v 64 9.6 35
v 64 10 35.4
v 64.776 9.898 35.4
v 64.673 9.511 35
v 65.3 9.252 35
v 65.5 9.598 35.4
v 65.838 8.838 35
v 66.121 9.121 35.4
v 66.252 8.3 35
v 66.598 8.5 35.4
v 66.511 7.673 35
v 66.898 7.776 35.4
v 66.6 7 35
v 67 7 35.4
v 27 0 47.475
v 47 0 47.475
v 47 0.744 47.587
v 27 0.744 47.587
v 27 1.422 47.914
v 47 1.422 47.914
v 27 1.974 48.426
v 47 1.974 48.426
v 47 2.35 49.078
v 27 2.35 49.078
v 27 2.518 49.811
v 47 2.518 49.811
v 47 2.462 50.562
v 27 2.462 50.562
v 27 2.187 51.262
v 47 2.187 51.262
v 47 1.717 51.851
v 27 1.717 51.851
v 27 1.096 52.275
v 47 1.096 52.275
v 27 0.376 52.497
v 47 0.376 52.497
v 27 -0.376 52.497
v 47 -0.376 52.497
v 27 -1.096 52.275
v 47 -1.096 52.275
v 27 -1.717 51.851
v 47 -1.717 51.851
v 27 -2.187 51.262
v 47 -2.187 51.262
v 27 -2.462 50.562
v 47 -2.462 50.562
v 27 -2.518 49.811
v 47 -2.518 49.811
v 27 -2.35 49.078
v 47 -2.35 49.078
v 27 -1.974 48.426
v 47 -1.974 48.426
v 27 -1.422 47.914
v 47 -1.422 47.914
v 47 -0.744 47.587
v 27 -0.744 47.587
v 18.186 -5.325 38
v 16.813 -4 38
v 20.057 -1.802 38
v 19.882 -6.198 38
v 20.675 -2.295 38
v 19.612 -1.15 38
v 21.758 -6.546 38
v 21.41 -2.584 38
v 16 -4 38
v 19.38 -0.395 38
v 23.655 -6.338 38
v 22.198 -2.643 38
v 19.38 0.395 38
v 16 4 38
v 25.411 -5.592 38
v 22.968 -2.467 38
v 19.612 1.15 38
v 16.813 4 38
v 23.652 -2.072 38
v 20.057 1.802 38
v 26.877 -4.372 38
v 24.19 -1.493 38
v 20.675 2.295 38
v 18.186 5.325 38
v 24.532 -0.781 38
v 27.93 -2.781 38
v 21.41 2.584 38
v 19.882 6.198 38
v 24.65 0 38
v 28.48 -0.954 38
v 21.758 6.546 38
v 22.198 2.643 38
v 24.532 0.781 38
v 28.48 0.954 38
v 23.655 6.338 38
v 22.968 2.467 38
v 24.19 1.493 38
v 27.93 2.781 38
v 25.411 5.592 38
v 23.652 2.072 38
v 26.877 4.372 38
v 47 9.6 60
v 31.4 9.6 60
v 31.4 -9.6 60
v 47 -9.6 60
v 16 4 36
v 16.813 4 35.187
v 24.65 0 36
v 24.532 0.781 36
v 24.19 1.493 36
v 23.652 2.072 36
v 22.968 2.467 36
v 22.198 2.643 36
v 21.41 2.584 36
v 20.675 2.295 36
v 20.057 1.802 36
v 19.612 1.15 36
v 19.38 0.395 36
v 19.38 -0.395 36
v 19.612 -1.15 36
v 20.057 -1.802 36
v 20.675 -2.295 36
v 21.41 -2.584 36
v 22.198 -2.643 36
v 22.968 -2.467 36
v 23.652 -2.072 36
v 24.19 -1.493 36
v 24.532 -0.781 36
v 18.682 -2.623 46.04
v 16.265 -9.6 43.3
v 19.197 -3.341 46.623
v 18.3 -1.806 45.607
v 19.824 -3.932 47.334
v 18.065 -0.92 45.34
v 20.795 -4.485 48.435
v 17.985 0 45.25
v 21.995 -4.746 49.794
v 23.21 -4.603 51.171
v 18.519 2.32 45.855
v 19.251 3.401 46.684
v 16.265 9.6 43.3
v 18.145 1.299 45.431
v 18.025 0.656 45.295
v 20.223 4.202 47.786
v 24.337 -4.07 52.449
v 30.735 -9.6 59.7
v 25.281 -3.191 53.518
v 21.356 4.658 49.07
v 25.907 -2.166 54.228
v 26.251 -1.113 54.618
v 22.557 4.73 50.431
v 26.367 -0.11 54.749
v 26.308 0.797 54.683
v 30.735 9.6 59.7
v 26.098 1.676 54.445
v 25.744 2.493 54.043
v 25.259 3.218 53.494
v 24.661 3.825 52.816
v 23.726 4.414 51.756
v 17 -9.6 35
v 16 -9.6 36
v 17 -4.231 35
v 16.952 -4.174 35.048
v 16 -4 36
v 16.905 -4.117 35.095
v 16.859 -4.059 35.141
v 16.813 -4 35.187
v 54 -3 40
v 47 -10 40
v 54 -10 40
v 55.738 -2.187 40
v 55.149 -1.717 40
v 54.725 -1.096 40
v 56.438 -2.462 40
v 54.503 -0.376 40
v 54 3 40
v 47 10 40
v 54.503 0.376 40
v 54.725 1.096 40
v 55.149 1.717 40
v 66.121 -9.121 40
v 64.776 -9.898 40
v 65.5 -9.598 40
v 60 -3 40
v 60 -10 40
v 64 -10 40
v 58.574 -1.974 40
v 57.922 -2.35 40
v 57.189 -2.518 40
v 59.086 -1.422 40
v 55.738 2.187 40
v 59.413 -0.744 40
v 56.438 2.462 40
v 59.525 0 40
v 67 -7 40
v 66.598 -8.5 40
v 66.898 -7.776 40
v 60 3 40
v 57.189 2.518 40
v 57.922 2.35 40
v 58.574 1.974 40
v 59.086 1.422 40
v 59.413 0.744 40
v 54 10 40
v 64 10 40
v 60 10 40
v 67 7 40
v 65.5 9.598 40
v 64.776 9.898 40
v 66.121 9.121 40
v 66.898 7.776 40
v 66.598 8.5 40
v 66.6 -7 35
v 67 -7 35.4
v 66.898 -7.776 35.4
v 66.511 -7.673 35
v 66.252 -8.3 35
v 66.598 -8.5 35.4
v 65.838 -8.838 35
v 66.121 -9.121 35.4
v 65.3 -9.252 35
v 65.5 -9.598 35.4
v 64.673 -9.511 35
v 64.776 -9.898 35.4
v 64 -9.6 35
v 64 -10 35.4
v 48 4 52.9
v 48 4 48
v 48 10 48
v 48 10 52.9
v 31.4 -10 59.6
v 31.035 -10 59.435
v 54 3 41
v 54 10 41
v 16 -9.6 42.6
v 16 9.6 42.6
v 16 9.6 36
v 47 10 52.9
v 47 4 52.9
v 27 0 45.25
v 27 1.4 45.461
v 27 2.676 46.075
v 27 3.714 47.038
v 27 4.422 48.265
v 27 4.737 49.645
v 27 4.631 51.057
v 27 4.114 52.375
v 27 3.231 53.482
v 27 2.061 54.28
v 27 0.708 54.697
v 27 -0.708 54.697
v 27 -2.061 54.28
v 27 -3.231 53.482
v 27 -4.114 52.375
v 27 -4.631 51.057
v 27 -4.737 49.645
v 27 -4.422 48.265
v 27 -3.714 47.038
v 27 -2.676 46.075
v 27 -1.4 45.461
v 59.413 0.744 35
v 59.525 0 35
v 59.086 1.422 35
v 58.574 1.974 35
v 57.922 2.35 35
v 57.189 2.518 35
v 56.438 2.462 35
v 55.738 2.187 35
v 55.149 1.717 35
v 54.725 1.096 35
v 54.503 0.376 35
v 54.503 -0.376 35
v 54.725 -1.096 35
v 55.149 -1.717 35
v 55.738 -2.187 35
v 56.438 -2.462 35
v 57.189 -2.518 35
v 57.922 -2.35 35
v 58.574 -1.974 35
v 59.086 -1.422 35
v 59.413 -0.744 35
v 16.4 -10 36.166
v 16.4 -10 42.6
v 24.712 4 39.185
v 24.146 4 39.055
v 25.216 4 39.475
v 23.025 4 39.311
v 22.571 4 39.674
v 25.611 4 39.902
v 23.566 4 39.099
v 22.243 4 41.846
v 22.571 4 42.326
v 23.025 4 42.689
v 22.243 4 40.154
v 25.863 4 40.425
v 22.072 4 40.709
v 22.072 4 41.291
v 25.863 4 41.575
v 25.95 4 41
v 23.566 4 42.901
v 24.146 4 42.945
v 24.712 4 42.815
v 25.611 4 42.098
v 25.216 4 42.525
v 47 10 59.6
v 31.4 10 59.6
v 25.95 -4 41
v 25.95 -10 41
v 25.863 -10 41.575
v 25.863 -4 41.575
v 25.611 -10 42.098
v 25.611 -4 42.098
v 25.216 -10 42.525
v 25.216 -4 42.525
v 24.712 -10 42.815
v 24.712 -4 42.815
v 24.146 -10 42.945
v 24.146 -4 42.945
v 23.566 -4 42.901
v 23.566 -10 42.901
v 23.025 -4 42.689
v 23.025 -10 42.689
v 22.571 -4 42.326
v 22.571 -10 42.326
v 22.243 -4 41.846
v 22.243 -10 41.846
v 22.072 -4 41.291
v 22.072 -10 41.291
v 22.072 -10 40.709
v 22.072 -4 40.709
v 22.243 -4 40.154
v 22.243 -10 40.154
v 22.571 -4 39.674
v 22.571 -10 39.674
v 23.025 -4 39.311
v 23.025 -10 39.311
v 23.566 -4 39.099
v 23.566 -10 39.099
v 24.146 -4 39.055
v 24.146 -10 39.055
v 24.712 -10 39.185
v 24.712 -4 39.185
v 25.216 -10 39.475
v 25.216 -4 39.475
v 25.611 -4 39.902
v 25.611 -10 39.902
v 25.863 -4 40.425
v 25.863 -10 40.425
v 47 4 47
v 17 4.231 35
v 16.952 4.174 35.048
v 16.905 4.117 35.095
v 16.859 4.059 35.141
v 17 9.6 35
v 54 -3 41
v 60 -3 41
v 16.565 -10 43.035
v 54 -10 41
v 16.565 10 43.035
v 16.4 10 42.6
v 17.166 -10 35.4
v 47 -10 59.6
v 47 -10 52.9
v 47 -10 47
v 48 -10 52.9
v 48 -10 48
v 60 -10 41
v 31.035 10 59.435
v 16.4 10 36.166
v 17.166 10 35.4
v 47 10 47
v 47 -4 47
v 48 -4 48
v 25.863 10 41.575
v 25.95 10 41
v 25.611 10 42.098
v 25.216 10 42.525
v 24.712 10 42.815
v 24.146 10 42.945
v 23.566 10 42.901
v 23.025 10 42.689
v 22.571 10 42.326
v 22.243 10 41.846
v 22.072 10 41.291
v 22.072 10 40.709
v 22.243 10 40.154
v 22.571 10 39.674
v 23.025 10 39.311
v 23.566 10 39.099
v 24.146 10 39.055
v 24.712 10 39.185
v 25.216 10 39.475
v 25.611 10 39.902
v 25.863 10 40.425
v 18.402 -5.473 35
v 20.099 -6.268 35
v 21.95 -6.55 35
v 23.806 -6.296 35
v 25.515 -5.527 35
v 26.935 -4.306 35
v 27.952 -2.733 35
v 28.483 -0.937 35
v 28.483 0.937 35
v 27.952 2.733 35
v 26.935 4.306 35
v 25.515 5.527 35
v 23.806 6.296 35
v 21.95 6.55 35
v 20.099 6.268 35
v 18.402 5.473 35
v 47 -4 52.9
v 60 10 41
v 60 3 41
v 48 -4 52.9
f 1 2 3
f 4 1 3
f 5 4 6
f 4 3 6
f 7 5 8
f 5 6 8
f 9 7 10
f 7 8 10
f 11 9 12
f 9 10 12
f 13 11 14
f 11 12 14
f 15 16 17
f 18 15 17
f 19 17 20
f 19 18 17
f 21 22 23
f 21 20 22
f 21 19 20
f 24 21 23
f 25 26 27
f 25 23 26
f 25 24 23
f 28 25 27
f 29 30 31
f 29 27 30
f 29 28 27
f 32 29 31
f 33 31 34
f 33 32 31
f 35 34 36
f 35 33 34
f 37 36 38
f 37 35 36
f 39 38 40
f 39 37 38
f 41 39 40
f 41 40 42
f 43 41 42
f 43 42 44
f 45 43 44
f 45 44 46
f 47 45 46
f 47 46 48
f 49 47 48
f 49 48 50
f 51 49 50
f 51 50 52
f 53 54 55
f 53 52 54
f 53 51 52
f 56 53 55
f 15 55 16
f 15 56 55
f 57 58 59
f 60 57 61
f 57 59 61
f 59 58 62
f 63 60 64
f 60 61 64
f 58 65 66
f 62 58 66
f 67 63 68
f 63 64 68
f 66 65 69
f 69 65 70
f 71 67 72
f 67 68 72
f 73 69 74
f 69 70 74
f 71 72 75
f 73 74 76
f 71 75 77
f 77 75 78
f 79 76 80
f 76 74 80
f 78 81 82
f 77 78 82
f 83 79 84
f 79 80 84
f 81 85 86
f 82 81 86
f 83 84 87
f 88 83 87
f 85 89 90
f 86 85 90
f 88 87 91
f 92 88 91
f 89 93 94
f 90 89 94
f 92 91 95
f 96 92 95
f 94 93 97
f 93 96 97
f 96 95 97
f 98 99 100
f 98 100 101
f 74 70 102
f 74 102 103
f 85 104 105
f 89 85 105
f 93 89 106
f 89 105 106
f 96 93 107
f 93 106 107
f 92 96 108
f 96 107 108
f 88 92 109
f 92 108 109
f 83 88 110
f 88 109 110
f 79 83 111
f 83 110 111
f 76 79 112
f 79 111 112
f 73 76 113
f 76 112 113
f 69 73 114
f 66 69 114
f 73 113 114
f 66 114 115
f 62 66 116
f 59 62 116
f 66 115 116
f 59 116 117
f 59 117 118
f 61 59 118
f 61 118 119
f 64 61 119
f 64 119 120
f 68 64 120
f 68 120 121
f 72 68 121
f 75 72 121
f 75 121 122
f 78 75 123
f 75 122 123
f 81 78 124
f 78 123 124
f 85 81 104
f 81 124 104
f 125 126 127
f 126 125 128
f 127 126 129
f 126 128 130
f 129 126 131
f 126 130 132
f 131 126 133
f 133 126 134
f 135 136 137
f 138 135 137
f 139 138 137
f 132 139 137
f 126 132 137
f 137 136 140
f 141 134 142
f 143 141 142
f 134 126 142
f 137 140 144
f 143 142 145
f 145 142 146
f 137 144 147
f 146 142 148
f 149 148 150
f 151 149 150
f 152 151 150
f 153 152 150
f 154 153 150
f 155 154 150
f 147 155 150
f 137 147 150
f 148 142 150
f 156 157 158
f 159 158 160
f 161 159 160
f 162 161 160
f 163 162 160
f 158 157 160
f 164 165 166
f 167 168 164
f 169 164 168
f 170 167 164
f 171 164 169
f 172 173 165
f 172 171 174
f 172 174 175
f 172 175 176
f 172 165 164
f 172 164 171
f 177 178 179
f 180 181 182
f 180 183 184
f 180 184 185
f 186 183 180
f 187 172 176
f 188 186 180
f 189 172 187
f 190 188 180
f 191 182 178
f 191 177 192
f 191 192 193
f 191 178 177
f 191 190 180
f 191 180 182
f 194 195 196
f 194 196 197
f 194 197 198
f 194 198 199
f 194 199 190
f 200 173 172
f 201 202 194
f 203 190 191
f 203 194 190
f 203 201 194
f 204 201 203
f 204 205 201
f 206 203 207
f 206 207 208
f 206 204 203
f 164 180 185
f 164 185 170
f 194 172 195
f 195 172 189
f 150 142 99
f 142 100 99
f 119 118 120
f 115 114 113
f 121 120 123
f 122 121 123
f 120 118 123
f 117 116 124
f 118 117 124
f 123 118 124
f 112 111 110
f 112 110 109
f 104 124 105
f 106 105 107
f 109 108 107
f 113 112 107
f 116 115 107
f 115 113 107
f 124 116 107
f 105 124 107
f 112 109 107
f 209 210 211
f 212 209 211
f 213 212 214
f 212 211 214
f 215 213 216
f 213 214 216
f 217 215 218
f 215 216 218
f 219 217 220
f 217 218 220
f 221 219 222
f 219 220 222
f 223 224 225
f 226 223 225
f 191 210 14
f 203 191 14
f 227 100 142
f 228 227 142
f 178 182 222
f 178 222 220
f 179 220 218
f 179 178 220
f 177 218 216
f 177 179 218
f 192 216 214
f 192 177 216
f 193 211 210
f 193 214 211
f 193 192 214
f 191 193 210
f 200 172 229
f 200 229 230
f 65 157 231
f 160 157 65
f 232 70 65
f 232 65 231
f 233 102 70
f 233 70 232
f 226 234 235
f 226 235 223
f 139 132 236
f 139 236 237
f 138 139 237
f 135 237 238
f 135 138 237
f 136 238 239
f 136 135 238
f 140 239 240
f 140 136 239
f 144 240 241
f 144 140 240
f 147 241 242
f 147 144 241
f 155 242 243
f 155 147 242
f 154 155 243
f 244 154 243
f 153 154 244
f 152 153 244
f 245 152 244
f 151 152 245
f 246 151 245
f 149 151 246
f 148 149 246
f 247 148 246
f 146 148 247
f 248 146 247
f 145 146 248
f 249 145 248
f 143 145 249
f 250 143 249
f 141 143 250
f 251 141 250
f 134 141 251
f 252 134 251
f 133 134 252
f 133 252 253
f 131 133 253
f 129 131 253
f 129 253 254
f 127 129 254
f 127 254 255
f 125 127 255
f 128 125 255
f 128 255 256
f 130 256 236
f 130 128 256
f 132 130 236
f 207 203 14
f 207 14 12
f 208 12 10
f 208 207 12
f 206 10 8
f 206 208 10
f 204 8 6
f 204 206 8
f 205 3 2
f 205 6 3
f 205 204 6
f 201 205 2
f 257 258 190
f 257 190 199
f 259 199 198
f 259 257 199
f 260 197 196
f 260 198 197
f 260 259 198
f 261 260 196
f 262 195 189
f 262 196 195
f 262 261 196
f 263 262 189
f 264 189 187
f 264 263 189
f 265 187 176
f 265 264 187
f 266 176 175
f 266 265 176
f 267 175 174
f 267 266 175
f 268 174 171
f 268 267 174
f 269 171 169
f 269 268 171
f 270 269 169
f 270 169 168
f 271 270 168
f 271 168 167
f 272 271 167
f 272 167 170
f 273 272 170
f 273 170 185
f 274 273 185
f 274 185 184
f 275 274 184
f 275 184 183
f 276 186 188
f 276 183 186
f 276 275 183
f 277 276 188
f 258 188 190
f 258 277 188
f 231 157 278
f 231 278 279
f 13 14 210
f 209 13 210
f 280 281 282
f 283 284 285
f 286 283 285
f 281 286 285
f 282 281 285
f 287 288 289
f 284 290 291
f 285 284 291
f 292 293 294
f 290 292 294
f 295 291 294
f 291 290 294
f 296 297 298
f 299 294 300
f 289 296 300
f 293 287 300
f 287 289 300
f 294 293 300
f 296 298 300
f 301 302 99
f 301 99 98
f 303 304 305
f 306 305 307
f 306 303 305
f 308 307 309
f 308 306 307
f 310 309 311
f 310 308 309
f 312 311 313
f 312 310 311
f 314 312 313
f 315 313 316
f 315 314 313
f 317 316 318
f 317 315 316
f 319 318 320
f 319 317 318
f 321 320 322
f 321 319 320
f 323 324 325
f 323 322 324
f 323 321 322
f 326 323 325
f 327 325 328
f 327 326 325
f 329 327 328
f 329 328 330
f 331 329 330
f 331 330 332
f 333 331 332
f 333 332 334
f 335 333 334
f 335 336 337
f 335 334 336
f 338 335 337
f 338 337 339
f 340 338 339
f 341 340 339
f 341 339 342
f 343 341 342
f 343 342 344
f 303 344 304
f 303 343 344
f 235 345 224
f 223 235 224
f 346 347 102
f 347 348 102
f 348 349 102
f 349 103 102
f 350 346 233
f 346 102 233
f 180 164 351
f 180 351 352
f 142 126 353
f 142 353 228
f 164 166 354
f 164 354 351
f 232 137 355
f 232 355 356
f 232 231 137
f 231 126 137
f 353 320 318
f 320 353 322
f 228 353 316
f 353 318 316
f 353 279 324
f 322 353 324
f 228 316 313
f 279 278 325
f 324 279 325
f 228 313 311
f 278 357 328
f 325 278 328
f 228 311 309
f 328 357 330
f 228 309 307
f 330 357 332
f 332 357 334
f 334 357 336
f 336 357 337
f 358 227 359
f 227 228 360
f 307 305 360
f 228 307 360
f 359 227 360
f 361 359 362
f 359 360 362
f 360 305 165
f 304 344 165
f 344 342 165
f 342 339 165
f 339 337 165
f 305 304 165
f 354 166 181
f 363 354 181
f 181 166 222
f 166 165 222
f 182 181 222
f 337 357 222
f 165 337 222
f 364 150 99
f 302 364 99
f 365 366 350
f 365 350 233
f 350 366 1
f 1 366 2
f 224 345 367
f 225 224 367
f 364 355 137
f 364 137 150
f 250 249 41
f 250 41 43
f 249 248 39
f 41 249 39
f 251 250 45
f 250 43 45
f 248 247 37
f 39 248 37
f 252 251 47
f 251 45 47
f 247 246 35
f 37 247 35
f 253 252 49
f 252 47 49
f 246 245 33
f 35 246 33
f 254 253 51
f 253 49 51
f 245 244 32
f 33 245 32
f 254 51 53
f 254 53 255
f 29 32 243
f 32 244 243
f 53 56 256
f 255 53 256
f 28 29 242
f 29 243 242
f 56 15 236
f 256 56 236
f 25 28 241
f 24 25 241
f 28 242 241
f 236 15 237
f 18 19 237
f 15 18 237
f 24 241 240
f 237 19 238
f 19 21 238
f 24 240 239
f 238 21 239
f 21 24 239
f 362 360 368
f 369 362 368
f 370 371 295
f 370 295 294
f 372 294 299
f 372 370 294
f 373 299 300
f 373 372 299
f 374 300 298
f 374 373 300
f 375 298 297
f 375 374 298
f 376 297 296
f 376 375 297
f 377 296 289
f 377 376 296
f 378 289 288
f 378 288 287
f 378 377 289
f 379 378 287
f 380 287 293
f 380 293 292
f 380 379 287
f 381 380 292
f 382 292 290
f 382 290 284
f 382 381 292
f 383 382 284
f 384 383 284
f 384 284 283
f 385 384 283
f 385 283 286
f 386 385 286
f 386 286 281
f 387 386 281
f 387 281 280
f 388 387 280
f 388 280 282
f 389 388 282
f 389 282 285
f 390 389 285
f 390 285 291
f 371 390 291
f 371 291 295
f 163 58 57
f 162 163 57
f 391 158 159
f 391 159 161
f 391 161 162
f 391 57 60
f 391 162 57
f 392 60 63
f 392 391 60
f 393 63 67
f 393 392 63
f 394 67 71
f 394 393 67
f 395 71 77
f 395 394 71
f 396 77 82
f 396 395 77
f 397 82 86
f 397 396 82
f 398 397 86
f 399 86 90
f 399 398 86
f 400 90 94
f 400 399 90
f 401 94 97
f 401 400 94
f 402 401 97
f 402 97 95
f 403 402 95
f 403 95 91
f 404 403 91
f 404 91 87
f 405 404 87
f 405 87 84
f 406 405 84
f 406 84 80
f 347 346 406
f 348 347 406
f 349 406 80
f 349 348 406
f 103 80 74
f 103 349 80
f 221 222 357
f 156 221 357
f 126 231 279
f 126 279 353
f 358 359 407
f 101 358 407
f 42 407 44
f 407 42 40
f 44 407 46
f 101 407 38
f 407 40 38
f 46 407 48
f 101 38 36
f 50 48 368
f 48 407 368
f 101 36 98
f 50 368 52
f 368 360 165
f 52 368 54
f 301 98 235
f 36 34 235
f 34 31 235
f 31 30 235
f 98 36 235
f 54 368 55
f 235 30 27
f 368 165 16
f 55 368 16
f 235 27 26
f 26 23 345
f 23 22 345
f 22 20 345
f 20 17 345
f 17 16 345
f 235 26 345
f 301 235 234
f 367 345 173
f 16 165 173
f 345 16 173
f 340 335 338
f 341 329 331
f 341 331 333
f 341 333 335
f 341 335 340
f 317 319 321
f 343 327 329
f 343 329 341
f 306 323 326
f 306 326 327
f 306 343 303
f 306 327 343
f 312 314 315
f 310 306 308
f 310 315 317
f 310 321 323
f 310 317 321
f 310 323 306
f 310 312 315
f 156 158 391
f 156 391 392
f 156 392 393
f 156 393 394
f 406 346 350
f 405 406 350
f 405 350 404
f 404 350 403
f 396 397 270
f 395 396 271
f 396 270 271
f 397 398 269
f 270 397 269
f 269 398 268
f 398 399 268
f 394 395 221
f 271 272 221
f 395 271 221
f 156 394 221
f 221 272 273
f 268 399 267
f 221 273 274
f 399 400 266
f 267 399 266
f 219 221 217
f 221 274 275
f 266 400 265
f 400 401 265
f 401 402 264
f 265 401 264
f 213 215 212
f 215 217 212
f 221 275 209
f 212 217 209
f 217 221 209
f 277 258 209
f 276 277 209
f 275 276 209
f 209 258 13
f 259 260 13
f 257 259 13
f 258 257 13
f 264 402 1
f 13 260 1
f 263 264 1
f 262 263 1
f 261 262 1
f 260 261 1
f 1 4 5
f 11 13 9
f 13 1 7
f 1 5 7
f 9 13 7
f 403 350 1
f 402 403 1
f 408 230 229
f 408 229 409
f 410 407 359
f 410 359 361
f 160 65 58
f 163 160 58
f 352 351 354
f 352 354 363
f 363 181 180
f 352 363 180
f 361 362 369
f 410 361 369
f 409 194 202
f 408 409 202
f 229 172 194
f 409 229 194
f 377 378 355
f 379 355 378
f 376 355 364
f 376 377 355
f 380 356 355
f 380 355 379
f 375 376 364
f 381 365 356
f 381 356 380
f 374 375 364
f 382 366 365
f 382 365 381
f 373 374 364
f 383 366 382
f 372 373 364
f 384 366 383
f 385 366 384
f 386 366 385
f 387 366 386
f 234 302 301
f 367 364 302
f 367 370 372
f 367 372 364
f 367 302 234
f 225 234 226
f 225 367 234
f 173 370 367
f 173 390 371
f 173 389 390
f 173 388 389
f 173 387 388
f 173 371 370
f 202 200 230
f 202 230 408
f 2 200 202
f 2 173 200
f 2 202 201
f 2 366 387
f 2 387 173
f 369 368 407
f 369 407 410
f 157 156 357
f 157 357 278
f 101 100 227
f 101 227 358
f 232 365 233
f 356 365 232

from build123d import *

# Parameters (mm, degrees)
CYLINDER012_R                      = 1.95
CYLINDER012_DEPTH                  = 10
CYLINDER011_R                      = 1.95
CYLINDER011_DEPTH                  = 10
CYLINDER007_R                      = 2.525
CYLINDER007_DEPTH                  = 37
CYLINDER008_R                      = 4.75
CYLINDER008_DEPTH                  = 13
CYLINDER006_R                      = 2.65
CYLINDER006_DEPTH                  = 2
CYLINDER005_R                      = 6.55
CYLINDER005_DEPTH                  = 5
BOX023_W                           = 12
BOX023_H                           = 8
BOX023_DEPTH                       = 10
BOX019_W                           = 2
BOX019_H                           = 6
BOX019_DEPTH                       = 5.9
BOX020_W                           = 2
BOX020_H                           = 6
BOX020_DEPTH                       = 5.9
CHAMFER004013007011015006006_SIZE  = 1
CYLINDER009_R                      = 2.525
CYLINDER009_DEPTH                  = 10
BOX018_W                           = 20
BOX018_H                           = 20
BOX018_DEPTH                       = 5
FILLET_R                           = 3
BOX021_W                           = 6
BOX021_H                           = 7
BOX021_DEPTH                       = 1
BOX022_W                           = 6
BOX022_H                           = 7
BOX022_DEPTH                       = 1
BOX017_W                           = 31
BOX017_H                           = 20
BOX017_DEPTH                       = 25
CHAMFER004013007011015006005_SIZE2 = 15
CHAMFER004013007011015006005_SIZE  = 17
CHAMFER004013007011015006007_SIZE  = 1
CHAMFER004013007011015006008_SIZE  = 0.4


with BuildPart() as cylinder012:
    # Cylinder012 → Cylinder012 (new body)
    with BuildSketch(Plane(origin=(24, 14, 41), x_dir=(1, 0, 0), z_dir=(0, -1, 0))):
        Circle(CYLINDER012_R)
    extrude(amount=CYLINDER012_DEPTH)


with BuildPart() as fusion004023:
    # Cylinder011 → Cylinder011 (new body)
    with BuildSketch(Plane(origin=(24, -4, 41), x_dir=(1, 0, 0), z_dir=(0, -1, 0))):
        Circle(CYLINDER011_R)
    extrude(amount=CYLINDER011_DEPTH)

    # Fusion004023: union Cylinder012
    add(cylinder012.part)


with BuildPart() as cylinder007:
    # Cylinder007 → Cylinder007 (new body)
    with BuildSketch(Plane(origin=(14, 0, 50), x_dir=(0, 0, -1), z_dir=(1, 0, 0))):
        Circle(CYLINDER007_R)
    extrude(amount=CYLINDER007_DEPTH)


with BuildPart() as fusion004019:
    # Cylinder008 → Cylinder008 (new body)
    with BuildSketch(Plane(origin=(14, 0, 50), x_dir=(0, 0, -1), z_dir=(1, 0, 0))):
        Circle(CYLINDER008_R)
    extrude(amount=CYLINDER008_DEPTH)

    # Fusion004019: union Cylinder007
    add(cylinder007.part)


with BuildPart() as cylinder006:
    # Cylinder006 → Cylinder006 (new body)
    with BuildSketch(Plane.XY.offset(3)):
        Circle(CYLINDER006_R)
    extrude(amount=CYLINDER006_DEPTH)


with BuildPart() as cut028006004005005:
    # Cylinder005 → Cylinder005 (new body)
    with BuildSketch(Plane.XY):
        Circle(CYLINDER005_R)
    extrude(amount=CYLINDER005_DEPTH)

    # Cut028006004005005: cut Cylinder006
    add(cylinder006.part, mode=Mode.SUBTRACT)


with BuildPart() as cut028006004005005_1:
    # Cut028006004005005 placement: moved
    add(cut028006004005005.part.moved(Location((22, 0, 33))))


with BuildPart() as fusion004022:
    # Box023 → Box023 (new body)
    with BuildSketch(Plane(origin=(7, -4, 28), x_dir=(1, 0, 0), z_dir=(0, 0, 1))):
        with Locations((6, 4)):
            Rectangle(BOX023_W, BOX023_H)
    extrude(amount=BOX023_DEPTH)

    # Fusion004022: union Cut028006004005005
    add(cut028006004005005_1.part)


with BuildPart() as cube019:
    # Box019 → Box019 (new body)
    with BuildSketch(Plane(origin=(46, -10, 47), x_dir=(1, 0, 0), z_dir=(0, 0, 1))):
        with Locations((1, 3)):
            Rectangle(BOX019_W, BOX019_H)
    extrude(amount=BOX019_DEPTH)


with BuildPart() as chamfer004013007011015006006:
    # Box020 → Box020 (new body)
    with BuildSketch(Plane(origin=(46, 4, 47), x_dir=(1, 0, 0), z_dir=(0, 0, 1))):
        with Locations((1, 3)):
            Rectangle(BOX020_W, BOX020_H)
    extrude(amount=BOX020_DEPTH)

    # Fusion004018: union Cube019
    add(cube019.part)

    # Chamfer004013007011015006006
    chamfer004013007011015006006_edges = [chamfer004013007011015006006.edges().sort_by_distance(p)[0] for p in [
        (48, 7, 47),
        (48, -7, 47),
    ]]
    chamfer(chamfer004013007011015006006_edges, length=CHAMFER004013007011015006006_SIZE)


with BuildPart() as cylinder009:
    # Cylinder009 → Cylinder009 (new body)
    with BuildSketch(Plane(origin=(57, 0, 32), x_dir=(1, 0, 0), z_dir=(0, 0, 1))):
        Circle(CYLINDER009_R)
    extrude(amount=CYLINDER009_DEPTH)


with BuildPart() as fillet_body:
    # Box018 → Box018 (new body)
    with BuildSketch(Plane(origin=(47, -10, 35), x_dir=(1, 0, 0), z_dir=(0, 0, 1))):
        with Locations((10, 10)):
            Rectangle(BOX018_W, BOX018_H)
    extrude(amount=BOX018_DEPTH)

    # Fillet
    fillet_edges = [fillet_body.edges().sort_by_distance(p)[0] for p in [
        (67, -10, 37.5),
        (67, 10, 37.5),
    ]]
    fillet(fillet_edges, radius=FILLET_R)


with BuildPart() as cube021:
    # Box021 → Box021 (new body)
    with BuildSketch(Plane(origin=(54, -10, 40), x_dir=(1, 0, 0), z_dir=(0, 0, 1))):
        with Locations((3, 3.5)):
            Rectangle(BOX021_W, BOX021_H)
    extrude(amount=BOX021_DEPTH)


with BuildPart() as cut028006004005004:
    # Box022 → Box022 (new body)
    with BuildSketch(Plane(origin=(54, 3, 40), x_dir=(1, 0, 0), z_dir=(0, 0, 1))):
        with Locations((3, 3.5)):
            Rectangle(BOX022_W, BOX022_H)
    extrude(amount=BOX022_DEPTH)

    # Fusion004020: union Fillet body, Cube021
    add(fillet_body.part)
    add(cube021.part)

    # Cut028006004005004: cut Cylinder009
    add(cylinder009.part, mode=Mode.SUBTRACT)


with BuildPart() as bed_frame_mounter_btm:
    # Box017 → Box017 (new body)
    with BuildSketch(Plane(origin=(16, -10, 35), x_dir=(1, 0, 0), z_dir=(0, 0, 1))):
        with Locations((15.5, 10)):
            Rectangle(BOX017_W, BOX017_H)
    extrude(amount=BOX017_DEPTH)

    # Chamfer004013007011015006005
    chamfer004013007011015006005_edges = [bed_frame_mounter_btm.edges().sort_by_distance(p)[0] for p in [
        (16, 0, 60),
    ]]
    chamfer004013007011015006005_side = bed_frame_mounter_btm.faces().sort_by_distance((16, 0, 47.5))[0]
    chamfer(chamfer004013007011015006005_edges, length=CHAMFER004013007011015006005_SIZE, length2=CHAMFER004013007011015006005_SIZE2, reference=chamfer004013007011015006005_side)

    # Fusion004021: union Chamfer004013007011015006006, Cut028006004005004
    add(chamfer004013007011015006006.part)
    add(cut028006004005004.part)

    # Cut028006004005006: cut Fusion004022
    add(fusion004022.part, mode=Mode.SUBTRACT)

    # Chamfer004013007011015006007
    chamfer004013007011015006007_edges = [bed_frame_mounter_btm.edges().sort_by_distance(p)[0] for p in [
        (16, 7, 35),
        (16, -7, 35),
    ]]
    chamfer(chamfer004013007011015006007_edges, length=CHAMFER004013007011015006007_SIZE)

    # Cut028006004005007: cut Fusion004019
    add(fusion004019.part, mode=Mode.SUBTRACT)

    # Chamfer004013007011015006008
    chamfer004013007011015006008_edges = [bed_frame_mounter_btm.edges().sort_by_distance(p)[0] for p in [
        (16, 10, 39.5),
        (16, 0, 43),
        (16, -10, 39.5),
        (16.5, 10, 35.5),
        (23.5, 10, 51.5),
        (32, 10, 35),
        (39, 10, 60),
        (23.5, -10, 51.5),
        (31, 0, 60),
        (16.5, -10, 35.5),
        (32, -10, 35),
        (39, -10, 60),
        (55.5, 10, 35),
        (55.5, -10, 35),
        (66.12132, 9.12132, 35),
        (67, 0, 35),
        (66.12132, -9.12132, 35),
    ]]
    chamfer(chamfer004013007011015006008_edges, length=CHAMFER004013007011015006008_SIZE)

    # Cut028006004005008: cut Fusion004023
    add(fusion004023.part, mode=Mode.SUBTRACT)


solid = bed_frame_mounter_btm.part
